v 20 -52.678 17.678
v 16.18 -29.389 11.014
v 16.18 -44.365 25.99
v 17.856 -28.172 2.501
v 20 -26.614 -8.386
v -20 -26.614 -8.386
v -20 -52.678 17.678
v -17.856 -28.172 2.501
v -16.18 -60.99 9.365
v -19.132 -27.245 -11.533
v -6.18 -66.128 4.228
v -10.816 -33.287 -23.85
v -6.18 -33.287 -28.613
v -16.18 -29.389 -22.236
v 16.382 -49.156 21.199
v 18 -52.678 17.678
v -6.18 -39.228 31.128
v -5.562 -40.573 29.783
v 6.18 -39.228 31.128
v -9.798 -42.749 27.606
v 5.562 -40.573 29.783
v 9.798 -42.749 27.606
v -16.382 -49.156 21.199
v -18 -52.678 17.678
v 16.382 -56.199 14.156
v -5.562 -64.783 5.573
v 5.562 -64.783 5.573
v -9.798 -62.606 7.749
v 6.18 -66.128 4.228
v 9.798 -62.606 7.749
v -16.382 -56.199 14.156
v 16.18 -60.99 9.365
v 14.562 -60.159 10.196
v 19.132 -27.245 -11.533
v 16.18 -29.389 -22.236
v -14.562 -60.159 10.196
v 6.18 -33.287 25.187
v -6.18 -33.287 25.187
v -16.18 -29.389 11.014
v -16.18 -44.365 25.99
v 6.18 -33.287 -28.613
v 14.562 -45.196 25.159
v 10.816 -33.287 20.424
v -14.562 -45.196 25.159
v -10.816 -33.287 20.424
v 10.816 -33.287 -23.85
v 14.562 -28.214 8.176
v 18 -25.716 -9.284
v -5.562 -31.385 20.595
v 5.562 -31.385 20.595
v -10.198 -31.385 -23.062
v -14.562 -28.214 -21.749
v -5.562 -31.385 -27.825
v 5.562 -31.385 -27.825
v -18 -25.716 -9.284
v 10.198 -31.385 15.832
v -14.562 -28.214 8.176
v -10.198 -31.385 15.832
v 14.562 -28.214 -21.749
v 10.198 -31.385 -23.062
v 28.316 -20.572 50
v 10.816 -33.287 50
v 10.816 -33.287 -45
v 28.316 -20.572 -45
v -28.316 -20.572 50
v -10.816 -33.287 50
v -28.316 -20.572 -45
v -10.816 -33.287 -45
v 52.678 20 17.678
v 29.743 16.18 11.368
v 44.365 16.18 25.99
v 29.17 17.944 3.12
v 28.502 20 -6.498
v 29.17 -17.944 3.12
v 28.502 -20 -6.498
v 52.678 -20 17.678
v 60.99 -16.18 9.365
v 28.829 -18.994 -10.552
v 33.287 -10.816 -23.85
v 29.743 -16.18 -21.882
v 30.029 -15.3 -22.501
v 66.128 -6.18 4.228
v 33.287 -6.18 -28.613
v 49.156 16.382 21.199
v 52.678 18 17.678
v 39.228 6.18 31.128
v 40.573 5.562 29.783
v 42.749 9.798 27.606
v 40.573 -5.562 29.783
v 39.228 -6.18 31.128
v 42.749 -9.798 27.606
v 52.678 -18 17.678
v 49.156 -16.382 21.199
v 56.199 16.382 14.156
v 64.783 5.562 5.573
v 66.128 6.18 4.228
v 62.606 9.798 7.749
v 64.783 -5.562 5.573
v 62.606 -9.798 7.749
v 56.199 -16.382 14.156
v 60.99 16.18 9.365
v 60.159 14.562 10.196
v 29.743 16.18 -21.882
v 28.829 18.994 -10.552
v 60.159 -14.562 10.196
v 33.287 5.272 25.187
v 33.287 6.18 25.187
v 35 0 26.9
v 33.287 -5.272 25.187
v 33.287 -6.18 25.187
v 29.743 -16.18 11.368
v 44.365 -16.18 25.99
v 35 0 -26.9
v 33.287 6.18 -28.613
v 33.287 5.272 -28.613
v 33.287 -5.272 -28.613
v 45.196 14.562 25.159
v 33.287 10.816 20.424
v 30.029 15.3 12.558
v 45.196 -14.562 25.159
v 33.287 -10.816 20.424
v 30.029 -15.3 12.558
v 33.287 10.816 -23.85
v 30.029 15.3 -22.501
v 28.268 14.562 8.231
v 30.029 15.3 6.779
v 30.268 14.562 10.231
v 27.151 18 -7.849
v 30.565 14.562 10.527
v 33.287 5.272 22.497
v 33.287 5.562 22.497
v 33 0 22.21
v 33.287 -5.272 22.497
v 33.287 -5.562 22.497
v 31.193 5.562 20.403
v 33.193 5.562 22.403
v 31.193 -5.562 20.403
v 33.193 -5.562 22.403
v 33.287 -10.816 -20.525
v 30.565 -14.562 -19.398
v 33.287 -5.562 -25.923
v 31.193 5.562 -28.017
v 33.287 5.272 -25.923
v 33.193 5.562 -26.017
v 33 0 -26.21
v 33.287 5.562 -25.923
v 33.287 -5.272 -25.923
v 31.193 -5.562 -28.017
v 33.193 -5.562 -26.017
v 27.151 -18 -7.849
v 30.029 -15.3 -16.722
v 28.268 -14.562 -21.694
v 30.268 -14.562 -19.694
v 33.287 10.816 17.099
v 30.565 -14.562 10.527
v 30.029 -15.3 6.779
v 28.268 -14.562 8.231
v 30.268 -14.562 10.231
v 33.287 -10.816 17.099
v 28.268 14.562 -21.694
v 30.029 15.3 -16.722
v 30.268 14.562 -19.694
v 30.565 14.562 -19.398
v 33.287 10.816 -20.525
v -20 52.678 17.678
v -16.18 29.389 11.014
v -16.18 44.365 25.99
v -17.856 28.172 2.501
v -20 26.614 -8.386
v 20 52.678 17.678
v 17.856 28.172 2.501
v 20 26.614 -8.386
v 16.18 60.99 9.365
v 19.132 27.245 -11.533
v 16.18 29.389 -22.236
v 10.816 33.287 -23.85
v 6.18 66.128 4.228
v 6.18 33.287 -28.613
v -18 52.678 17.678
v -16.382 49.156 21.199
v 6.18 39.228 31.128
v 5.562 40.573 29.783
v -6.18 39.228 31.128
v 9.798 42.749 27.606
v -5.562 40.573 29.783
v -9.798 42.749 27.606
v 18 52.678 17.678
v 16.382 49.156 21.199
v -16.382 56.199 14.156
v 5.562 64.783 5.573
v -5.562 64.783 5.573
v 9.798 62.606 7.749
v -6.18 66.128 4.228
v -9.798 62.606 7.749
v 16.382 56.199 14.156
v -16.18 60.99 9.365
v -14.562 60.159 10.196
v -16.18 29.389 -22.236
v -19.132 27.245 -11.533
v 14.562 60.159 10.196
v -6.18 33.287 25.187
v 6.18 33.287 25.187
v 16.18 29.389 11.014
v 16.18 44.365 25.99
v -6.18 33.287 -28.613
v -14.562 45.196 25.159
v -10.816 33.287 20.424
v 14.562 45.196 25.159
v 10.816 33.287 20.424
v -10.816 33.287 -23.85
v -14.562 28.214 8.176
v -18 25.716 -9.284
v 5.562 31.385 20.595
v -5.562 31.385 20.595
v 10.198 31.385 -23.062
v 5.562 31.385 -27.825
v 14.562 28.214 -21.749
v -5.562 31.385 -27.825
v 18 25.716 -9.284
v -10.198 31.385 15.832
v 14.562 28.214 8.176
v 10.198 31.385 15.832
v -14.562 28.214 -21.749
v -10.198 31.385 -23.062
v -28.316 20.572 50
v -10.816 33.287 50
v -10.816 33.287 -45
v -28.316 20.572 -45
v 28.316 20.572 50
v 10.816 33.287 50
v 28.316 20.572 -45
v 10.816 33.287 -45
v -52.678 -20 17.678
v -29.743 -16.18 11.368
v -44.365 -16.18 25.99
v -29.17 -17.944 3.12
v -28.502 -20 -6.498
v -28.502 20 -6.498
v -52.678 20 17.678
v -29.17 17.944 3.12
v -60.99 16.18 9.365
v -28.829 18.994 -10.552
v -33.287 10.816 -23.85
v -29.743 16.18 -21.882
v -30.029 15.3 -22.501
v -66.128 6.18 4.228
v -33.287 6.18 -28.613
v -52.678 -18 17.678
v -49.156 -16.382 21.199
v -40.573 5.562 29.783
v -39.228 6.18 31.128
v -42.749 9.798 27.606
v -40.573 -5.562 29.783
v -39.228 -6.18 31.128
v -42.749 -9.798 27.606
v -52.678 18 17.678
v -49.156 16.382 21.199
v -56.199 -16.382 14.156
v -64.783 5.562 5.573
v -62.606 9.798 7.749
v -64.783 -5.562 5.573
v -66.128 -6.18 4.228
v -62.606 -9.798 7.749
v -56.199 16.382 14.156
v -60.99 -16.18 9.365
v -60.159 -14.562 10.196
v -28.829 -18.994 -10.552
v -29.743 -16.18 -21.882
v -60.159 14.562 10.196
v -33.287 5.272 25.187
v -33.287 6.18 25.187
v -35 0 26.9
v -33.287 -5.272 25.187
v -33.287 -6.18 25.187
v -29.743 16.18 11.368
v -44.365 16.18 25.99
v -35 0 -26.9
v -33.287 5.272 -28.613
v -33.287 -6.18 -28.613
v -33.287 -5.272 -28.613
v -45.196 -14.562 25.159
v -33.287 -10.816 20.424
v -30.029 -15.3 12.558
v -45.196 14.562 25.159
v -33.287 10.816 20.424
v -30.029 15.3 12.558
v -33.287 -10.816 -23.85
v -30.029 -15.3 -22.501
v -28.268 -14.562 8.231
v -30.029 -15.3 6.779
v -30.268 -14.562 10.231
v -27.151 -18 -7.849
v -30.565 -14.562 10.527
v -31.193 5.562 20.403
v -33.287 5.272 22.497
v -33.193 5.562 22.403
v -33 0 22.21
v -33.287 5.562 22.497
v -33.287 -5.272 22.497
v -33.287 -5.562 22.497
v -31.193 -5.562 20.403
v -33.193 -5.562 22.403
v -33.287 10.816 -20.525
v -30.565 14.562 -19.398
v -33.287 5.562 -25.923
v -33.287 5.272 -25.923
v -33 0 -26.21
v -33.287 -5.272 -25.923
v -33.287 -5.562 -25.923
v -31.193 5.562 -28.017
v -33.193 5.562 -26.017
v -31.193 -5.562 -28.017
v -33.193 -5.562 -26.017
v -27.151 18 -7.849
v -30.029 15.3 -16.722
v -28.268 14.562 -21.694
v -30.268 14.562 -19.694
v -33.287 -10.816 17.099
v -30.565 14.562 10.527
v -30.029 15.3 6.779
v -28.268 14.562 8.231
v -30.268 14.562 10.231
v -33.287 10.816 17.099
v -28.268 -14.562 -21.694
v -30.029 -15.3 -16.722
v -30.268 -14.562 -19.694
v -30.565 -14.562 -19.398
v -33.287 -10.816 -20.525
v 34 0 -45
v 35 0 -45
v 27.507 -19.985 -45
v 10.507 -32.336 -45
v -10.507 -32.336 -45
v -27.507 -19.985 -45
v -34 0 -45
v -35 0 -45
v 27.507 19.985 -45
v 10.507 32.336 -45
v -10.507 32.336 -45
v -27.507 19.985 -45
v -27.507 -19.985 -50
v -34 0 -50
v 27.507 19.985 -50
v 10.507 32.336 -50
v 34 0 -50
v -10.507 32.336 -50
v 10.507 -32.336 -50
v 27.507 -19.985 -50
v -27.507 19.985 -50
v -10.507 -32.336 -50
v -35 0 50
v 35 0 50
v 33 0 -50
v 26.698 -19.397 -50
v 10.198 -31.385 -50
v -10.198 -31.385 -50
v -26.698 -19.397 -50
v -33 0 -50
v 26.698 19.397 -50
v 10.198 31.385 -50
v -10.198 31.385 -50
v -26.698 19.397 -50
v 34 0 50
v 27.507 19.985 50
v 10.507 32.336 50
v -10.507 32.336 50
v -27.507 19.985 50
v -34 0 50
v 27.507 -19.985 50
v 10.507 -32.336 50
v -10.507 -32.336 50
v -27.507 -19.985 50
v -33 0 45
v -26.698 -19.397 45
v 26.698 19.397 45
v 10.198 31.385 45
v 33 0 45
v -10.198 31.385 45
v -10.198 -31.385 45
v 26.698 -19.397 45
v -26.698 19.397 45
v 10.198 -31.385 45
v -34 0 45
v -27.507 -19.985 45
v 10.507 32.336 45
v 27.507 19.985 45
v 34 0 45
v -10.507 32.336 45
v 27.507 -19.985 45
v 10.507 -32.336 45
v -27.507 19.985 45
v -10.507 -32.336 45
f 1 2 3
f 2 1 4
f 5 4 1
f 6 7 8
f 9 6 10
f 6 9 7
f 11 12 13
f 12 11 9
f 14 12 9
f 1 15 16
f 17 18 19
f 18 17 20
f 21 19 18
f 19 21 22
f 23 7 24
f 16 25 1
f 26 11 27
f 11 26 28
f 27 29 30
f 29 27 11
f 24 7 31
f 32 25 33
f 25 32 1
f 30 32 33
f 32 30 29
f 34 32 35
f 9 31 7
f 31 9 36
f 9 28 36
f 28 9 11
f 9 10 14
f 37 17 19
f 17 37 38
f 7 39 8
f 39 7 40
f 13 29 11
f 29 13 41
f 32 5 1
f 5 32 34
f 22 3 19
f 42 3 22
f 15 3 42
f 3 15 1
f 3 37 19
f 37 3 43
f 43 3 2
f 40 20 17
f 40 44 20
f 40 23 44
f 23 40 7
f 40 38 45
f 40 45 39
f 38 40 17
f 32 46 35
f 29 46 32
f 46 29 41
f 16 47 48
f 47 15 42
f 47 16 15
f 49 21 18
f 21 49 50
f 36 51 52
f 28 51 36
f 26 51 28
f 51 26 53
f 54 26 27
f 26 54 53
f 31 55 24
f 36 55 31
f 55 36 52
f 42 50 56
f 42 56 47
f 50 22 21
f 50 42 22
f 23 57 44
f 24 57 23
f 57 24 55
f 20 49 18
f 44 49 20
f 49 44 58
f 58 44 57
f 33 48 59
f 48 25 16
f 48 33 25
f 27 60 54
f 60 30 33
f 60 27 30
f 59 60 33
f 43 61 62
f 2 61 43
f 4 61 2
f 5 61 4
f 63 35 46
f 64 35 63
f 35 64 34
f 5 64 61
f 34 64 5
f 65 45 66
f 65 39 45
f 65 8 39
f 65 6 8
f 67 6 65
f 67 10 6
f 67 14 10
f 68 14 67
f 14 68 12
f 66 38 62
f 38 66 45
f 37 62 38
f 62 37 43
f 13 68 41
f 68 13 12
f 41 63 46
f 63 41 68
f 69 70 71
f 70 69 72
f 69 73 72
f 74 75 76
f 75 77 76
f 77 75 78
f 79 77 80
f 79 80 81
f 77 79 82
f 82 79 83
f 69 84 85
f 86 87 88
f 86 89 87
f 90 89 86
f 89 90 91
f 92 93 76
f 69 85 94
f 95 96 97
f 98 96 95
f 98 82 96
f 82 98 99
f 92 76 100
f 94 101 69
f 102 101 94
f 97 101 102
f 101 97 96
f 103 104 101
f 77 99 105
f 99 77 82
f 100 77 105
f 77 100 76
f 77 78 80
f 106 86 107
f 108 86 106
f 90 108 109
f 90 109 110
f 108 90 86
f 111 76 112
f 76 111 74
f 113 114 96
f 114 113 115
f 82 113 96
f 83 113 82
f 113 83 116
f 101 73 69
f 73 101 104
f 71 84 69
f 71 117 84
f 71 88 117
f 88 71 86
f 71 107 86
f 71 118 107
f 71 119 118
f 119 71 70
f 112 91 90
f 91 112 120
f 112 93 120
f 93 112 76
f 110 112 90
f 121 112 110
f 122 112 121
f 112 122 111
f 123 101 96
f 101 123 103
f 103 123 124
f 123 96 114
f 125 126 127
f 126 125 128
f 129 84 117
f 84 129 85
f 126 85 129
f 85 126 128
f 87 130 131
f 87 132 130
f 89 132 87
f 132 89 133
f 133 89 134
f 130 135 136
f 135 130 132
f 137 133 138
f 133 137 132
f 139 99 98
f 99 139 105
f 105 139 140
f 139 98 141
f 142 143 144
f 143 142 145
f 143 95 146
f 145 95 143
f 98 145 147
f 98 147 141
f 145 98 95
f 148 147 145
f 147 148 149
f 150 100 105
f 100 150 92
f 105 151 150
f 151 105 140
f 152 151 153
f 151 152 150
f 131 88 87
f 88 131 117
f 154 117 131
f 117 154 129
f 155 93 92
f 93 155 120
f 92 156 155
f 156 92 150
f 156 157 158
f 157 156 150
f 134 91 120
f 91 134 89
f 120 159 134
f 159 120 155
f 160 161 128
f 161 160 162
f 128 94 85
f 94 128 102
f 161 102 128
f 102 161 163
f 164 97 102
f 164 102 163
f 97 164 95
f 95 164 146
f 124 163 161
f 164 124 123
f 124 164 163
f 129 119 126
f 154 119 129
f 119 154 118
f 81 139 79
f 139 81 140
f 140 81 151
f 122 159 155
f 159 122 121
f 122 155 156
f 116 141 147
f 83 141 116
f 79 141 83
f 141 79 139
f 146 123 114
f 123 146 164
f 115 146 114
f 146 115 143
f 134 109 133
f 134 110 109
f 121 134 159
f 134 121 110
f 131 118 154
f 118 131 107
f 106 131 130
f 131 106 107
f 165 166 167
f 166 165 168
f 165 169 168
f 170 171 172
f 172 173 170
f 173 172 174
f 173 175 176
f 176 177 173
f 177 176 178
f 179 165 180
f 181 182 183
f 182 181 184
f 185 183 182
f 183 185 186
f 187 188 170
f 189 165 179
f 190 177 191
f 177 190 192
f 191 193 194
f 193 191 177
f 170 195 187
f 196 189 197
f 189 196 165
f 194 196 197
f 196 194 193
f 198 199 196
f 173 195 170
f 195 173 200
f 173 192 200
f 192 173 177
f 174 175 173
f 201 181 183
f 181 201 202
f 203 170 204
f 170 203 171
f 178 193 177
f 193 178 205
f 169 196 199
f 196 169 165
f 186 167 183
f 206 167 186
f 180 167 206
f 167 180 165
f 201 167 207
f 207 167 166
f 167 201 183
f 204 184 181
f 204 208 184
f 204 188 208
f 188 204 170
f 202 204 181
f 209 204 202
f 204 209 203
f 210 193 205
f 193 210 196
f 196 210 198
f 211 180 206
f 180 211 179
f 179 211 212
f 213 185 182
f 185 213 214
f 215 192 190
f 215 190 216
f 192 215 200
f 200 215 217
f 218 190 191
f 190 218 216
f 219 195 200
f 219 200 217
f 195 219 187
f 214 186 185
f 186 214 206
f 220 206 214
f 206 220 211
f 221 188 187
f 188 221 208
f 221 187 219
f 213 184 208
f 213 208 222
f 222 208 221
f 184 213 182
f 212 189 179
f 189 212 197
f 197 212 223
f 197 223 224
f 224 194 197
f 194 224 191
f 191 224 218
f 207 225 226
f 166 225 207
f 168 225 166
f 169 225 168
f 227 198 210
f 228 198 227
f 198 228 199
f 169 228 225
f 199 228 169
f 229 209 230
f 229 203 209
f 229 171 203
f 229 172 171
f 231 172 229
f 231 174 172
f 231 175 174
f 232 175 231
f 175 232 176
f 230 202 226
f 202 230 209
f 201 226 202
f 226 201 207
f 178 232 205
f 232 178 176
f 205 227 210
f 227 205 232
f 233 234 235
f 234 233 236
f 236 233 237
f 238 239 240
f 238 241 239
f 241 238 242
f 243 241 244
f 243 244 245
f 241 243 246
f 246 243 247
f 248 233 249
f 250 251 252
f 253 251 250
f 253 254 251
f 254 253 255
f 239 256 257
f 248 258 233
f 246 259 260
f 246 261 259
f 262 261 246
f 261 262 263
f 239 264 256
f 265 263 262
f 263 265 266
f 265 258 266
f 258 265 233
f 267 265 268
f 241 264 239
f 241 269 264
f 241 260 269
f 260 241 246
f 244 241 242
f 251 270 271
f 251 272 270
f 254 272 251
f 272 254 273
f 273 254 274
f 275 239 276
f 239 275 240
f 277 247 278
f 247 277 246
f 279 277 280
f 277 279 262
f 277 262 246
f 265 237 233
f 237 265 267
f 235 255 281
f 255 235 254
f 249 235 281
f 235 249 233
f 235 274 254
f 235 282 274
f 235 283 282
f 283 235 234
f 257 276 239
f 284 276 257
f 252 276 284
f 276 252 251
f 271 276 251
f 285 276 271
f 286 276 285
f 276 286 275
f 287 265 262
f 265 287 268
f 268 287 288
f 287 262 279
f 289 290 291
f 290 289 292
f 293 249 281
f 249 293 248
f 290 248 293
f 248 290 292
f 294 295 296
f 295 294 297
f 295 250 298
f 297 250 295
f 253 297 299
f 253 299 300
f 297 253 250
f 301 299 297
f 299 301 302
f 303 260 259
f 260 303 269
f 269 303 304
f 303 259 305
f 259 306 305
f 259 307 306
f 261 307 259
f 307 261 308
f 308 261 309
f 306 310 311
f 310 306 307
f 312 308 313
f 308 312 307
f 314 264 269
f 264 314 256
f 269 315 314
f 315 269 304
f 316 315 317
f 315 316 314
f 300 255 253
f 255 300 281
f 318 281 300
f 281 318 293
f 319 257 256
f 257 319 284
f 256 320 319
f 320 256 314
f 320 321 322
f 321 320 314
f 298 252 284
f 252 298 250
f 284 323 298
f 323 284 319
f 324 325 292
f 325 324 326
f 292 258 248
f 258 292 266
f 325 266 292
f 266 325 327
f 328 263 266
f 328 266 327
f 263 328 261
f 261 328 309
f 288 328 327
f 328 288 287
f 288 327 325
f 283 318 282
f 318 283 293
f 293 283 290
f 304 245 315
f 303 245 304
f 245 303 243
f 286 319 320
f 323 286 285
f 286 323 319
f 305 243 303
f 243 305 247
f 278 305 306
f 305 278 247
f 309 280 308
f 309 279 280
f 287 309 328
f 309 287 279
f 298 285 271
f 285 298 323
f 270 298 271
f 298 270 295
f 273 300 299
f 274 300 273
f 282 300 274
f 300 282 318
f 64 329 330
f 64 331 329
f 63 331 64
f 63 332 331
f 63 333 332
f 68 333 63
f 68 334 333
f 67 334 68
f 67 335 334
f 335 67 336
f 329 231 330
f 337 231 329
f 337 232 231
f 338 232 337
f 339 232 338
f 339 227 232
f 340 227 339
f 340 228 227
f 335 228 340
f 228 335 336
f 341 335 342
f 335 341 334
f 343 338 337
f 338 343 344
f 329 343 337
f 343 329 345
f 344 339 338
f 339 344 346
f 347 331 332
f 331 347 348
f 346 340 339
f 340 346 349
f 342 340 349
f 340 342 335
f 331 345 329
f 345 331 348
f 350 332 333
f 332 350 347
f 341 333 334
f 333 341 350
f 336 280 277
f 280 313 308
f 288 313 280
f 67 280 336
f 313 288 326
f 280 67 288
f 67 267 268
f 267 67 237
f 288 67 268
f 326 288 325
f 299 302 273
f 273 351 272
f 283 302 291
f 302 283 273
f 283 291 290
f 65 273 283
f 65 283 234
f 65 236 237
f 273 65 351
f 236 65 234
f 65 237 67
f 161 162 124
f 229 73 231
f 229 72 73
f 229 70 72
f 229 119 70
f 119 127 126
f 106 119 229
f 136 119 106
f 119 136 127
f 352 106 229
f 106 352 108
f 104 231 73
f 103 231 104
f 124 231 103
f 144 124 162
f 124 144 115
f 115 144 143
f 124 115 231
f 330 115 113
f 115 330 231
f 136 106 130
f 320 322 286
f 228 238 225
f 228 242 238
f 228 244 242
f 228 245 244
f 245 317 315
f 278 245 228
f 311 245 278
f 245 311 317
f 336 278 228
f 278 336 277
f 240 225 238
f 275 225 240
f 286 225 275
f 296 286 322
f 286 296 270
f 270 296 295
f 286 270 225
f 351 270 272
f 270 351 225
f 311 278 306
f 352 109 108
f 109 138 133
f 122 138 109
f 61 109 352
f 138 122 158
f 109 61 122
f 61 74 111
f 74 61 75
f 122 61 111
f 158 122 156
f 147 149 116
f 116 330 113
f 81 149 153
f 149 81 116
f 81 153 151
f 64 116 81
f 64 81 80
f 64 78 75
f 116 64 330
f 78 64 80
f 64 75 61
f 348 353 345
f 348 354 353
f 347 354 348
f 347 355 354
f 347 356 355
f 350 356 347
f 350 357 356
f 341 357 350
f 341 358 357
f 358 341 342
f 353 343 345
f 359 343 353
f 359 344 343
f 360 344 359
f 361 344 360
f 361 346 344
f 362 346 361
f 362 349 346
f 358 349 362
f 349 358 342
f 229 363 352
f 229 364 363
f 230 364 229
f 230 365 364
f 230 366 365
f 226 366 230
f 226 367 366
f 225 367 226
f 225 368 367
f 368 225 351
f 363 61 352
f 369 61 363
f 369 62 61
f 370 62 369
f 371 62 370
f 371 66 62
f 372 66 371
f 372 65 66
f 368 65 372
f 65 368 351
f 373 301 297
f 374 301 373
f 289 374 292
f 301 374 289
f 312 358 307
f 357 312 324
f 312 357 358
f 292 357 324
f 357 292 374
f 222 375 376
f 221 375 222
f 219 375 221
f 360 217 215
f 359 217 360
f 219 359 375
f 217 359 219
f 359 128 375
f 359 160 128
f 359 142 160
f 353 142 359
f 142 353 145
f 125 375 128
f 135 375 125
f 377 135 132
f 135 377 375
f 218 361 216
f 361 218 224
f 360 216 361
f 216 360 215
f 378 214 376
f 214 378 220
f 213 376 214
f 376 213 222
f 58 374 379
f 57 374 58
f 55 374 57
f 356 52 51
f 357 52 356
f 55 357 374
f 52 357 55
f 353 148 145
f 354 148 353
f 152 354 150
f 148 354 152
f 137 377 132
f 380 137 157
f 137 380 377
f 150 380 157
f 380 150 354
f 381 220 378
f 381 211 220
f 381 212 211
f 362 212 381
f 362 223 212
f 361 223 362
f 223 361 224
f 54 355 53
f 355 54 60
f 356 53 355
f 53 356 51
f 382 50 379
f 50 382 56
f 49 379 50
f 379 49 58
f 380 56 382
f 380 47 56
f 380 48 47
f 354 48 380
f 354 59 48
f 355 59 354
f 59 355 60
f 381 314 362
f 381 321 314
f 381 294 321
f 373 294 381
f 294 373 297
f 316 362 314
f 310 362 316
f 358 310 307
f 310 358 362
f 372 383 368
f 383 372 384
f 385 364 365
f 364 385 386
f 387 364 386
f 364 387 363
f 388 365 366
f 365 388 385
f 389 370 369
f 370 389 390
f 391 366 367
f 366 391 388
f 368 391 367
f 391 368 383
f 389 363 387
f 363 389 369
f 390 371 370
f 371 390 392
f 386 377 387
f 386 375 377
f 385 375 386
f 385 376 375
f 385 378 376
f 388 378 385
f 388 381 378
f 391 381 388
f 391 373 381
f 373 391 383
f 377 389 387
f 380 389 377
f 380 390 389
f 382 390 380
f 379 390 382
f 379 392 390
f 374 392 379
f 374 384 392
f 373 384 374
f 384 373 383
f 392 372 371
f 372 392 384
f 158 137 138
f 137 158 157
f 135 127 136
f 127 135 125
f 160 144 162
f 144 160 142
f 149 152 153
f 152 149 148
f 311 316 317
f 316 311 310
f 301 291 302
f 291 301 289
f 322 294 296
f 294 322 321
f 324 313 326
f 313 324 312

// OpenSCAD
// file: x-way.scad
include<_variables.scad>;

// Parts
module main_body() {
    difference() {
        // Cylinder
        main_body_outer();
        main_body_inner();

        // Top joining
        translate([0, 0, $main_height/2]) cylinder(h = $joining_height, r = $joining_radius, center = true);

        // Bottom joining
        translate([0, 0, -$main_height/2])
        difference() {
            cylinder(h = $joining_height, r = $main_radius + 1, center = true);
            cylinder(h = $joining_height, r = $joining_radius, center = true);
        }
    }
}

module main_body_outer() {
    cylinder(h = $main_height, r = $main_radius, center = true);
}

module main_body_inner() {
    cylinder(h = $main_height + 1, r = $main_radius - $wall_thickness, center = true);
}

module tube_body(r, t) {
    difference() {
        difference() {
            tube_body_outer(r, t);
            tube_body_inner(r, t);
        }
        main_body_outer();
    }
}

module tube_body_outer(r, t) {
    translate(t) {
        rotate(r) {
            cylinder(h = $tube_height, r = $tube_radius, center = true);
        }
    }
}

module tube_body_inner(r, t) {
    translate(t) {
        rotate(r) {
            cylinder(h = $tube_height + 1, r = $tube_radius - $wall_thickness, center = true);
        }
    }
}

// Assembled modules

module xWay(count) {
    $max_angle = 180;
    $per_item = $max_angle / count;
    
    if(count > 0) {
        for (i = [0 : count - 1]) {
            rotate([0, 0, i * $per_item * 2]) tube_body([45, 0, 0], [0, -$main_radius, 0]);
        }
    }

    difference() {
        main_body();
        if(count > 0) {
            for (i = [0 : count - 1]) {
                rotate([0, 0, i * $per_item * 2]) tube_body_inner([45, 0, 0], [0, -$main_radius, 0]);
            }
        }
    }
}
// file: _variables.scad
/* [Render] */
$fa=1;
$fs=0.4;
$fn=10;
$show_helpers = false;

/* [General] */
$wall_thickness = 2;

/* [Main Body] */
$main_height = 100;
$main_radius = 35;
$joining_height = 10;
$joining_radius = $main_radius - $wall_thickness / 2;

/* [Tubes] */
$tube_height = $main_height / 2;
$tube_radius = $main_radius - 15;
$tube_hole_dimensions = 15;
$tube_hole_offset = 0;

/* [Cover] */
$hole_radius = $main_radius / 2.5;

/* [Planter] */
$stripes_count = 8;
$stripe_width = 5.0;
$planter_hole_radius = 2.5;

/* [Tray] */
$tray_thickness = 2.5;
$tray_hole_radius = 1;
$tray_radius = $main_radius - $wall_thickness;
$tray_holes_per_rotation = 4;
$tray_rotations = 16;

/* [Water Column] */
$water_column_radius = 5;
// main file
include<_variables.scad>;
use <x-way.scad>;

/*  Check settings ("customizer variables") in x-way.scad.
    The current config is pre-defined for a 150x150x150mm printing area.
    To tweak use one of the following:
    1. via OpenSCAD's Command-Line
        Use the `--D` flag to change variables.
        E.g. `--D $fn=100` to make the circles smooth.
    2. via OpenSCAD GUI
        Open this file and check the Customizer panel.
        In case the variables don't show up, proceed to the 3rd option.
    3. via an Editor (or OpenSCAD GUI)
        Open the file from above (`use <THIS FILE.scad>`) in either 
        an Editor or OpenSCAD GUI and change the variables in code
        or inside the Customizer. 
        Afterwards (re-)open this file in OpenSCAD and see the changes.

        Note: Editing the variables inside the code will affect ALL models
        depending on it. This can have advantages, but also disadvantages.
*/

// --- 

xWay(4);
